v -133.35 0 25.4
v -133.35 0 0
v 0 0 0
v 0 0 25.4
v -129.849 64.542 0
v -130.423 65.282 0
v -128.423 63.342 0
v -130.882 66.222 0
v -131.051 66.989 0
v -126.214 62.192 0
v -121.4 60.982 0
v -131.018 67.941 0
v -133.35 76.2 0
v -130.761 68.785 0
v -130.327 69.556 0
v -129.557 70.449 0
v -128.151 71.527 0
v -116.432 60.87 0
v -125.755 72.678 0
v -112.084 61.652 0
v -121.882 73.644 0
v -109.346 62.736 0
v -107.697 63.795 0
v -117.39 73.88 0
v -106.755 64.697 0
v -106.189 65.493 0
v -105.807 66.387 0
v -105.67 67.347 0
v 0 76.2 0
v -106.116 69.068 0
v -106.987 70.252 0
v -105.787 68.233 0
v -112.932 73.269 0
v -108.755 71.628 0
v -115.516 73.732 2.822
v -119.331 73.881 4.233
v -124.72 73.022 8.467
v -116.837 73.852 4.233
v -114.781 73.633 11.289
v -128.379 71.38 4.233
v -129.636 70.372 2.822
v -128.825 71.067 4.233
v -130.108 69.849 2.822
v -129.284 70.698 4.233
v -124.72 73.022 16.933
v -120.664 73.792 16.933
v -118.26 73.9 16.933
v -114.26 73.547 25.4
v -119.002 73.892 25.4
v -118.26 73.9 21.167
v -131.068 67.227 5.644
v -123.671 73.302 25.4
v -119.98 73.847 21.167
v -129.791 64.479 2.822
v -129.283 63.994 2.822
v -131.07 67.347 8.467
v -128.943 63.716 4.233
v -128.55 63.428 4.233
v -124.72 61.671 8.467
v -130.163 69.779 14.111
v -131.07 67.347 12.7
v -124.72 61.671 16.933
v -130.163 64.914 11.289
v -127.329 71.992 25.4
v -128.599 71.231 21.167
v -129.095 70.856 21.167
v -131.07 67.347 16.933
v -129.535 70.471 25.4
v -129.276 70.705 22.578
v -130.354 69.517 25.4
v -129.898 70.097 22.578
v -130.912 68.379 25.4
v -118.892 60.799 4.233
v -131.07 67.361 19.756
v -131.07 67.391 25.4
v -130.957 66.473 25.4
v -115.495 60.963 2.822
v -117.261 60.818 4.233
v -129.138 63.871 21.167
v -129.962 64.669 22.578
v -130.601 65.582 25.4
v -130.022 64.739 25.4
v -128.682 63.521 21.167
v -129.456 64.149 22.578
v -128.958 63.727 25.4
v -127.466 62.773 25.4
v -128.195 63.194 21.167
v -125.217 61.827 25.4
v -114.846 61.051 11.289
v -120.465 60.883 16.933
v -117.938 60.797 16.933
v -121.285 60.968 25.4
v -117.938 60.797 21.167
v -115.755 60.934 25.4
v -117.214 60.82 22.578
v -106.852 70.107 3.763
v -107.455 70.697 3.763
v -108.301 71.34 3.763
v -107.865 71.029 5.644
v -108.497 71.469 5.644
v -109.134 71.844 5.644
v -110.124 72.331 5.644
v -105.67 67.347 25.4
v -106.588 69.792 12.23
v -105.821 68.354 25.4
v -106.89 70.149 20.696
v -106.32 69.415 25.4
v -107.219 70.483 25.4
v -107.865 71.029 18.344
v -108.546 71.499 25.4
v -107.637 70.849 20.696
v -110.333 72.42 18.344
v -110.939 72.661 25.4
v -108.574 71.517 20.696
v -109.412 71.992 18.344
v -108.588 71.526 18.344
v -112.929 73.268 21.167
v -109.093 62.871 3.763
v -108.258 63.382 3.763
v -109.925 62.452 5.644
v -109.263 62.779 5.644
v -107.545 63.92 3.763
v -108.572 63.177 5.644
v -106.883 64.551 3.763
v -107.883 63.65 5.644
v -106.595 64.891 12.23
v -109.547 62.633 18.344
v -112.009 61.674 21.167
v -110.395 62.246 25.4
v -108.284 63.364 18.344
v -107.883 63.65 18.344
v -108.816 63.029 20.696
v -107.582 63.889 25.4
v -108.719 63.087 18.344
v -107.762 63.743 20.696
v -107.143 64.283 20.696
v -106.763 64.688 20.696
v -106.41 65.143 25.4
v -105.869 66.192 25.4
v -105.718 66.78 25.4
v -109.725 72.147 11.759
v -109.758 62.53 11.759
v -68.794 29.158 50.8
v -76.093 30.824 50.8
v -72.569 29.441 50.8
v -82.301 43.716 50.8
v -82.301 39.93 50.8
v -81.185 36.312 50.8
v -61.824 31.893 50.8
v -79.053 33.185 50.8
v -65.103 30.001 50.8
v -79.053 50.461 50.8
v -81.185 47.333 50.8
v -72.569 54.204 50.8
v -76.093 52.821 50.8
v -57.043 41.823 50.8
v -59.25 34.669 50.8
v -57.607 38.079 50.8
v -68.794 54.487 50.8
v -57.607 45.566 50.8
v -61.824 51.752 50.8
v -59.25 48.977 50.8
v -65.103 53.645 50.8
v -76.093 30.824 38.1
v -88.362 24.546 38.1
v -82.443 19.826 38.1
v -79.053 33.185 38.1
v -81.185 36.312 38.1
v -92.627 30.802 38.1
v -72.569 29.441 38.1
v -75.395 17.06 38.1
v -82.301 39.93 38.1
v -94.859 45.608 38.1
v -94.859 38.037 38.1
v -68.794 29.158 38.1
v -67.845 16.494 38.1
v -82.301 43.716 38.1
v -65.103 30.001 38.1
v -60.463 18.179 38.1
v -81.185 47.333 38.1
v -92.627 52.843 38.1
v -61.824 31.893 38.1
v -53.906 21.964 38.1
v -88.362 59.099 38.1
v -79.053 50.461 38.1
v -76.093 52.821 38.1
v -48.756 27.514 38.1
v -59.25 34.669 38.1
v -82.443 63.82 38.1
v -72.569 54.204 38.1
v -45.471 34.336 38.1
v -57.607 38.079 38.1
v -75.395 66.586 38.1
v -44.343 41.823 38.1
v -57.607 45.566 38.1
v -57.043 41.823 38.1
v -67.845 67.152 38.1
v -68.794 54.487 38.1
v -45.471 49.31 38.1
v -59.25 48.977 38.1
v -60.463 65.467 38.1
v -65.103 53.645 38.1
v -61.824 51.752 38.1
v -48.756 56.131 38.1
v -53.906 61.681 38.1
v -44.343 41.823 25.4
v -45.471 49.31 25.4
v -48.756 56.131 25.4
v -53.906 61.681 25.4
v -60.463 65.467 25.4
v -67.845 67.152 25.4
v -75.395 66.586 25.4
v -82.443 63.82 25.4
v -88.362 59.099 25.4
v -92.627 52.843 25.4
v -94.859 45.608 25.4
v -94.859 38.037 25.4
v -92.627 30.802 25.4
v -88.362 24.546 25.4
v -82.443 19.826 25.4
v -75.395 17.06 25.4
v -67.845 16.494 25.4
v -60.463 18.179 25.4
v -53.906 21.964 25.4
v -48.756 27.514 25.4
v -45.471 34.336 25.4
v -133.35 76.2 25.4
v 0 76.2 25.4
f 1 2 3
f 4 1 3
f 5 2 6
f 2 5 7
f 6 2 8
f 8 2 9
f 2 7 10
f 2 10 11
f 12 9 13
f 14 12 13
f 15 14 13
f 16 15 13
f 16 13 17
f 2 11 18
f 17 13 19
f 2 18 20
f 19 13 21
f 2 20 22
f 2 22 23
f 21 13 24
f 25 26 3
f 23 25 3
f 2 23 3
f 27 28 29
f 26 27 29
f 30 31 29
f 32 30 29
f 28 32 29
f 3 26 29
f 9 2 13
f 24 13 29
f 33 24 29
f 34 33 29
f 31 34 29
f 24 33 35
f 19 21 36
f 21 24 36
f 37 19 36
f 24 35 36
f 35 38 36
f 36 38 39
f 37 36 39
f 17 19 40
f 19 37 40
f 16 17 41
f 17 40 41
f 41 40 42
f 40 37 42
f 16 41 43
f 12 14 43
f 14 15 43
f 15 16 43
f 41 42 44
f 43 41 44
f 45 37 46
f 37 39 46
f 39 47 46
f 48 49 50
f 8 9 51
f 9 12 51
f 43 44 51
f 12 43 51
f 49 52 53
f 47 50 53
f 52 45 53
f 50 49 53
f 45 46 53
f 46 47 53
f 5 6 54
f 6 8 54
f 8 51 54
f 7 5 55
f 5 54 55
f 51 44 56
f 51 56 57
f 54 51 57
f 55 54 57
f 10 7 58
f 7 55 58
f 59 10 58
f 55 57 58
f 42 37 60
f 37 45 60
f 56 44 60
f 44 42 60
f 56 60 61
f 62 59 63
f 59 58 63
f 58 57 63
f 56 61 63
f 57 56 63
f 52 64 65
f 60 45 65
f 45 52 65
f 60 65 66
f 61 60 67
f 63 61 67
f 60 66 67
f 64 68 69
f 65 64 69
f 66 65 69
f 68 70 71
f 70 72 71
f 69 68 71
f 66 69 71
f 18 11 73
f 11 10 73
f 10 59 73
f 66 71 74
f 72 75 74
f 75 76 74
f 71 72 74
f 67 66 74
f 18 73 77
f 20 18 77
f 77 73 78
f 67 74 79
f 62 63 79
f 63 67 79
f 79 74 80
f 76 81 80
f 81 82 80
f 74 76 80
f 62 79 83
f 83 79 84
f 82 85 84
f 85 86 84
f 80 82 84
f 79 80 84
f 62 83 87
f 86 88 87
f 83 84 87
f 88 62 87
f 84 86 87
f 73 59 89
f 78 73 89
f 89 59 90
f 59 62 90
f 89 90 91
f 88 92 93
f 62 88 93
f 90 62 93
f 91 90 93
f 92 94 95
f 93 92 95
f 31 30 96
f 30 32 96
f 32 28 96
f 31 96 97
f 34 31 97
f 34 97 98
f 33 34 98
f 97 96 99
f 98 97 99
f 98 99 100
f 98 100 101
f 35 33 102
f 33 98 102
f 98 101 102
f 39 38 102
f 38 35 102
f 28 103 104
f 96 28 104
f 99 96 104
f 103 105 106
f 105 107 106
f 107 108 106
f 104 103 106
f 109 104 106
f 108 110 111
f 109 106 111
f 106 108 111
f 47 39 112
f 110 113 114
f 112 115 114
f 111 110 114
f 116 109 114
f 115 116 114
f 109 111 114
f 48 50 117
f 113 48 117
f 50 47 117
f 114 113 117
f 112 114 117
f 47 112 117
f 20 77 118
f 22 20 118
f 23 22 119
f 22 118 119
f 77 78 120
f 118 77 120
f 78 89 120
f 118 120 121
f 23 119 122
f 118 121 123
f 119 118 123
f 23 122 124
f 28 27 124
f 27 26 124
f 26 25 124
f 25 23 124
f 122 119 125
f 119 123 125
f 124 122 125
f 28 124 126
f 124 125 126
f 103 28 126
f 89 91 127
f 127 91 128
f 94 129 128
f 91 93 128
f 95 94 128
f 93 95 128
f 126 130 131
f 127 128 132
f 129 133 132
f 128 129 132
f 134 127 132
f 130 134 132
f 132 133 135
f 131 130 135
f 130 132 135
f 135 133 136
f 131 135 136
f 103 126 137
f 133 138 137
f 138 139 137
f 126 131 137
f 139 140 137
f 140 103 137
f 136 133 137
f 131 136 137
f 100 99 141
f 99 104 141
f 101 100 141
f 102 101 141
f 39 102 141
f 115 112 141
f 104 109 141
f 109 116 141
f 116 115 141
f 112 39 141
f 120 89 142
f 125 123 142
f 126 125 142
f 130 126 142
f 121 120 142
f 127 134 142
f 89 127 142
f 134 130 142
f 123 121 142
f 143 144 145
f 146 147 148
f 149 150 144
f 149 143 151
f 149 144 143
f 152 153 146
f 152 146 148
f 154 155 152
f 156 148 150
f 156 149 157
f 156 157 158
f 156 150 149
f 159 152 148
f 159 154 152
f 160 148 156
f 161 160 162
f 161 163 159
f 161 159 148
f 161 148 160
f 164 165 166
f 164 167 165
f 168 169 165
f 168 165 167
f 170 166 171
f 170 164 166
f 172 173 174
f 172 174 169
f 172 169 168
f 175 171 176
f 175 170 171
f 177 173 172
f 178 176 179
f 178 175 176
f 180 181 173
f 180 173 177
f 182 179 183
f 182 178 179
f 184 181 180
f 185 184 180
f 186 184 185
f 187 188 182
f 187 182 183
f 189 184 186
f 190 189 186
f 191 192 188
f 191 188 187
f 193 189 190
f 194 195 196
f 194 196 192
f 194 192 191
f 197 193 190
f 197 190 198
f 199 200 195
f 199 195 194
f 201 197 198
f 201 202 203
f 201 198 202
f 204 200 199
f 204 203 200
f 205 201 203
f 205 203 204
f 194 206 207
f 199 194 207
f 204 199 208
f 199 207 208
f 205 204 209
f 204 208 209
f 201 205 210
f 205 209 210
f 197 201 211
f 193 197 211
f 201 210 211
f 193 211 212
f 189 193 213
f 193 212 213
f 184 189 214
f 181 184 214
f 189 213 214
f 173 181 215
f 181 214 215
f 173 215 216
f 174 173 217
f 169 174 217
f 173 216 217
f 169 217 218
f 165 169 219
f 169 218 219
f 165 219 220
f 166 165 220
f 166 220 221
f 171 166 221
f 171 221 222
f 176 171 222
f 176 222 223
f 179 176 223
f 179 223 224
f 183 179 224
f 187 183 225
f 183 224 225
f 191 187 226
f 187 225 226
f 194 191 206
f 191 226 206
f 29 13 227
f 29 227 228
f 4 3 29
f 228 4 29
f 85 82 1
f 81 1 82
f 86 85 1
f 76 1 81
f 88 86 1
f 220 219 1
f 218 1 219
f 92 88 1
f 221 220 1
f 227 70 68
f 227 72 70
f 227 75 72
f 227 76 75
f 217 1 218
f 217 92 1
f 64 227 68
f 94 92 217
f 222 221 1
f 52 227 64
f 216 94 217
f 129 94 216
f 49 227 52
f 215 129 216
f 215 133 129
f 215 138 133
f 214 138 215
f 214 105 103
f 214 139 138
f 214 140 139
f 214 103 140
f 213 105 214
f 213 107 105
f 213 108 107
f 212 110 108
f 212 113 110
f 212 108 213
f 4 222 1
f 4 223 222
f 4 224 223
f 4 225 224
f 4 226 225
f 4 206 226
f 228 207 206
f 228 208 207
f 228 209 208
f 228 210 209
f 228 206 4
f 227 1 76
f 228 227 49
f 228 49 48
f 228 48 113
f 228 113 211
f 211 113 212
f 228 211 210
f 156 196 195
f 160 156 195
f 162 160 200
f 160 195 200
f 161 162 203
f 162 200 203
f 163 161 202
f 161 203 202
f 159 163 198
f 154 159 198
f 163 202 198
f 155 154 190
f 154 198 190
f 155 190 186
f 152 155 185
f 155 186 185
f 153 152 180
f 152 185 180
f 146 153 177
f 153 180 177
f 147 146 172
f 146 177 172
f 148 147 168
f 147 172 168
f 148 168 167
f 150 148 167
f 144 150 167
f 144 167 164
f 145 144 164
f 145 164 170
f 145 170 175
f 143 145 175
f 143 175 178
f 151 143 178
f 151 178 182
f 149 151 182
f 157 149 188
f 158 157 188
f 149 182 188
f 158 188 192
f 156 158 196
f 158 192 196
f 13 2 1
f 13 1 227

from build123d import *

# Parameters (mm, degrees)
F0_W     = 133.35
F0_H     = 76.2
F1_DEPTH = 25.4
F2_R     = 25.4
F3_DEPTH = 12.7
F4_R     = 12.7
F5_DEPTH = 12.7
F7_DEPTH = 25.401


with BuildPart() as f1:
    # F0 (on Top) → F1 (new body)
    with BuildSketch(Plane.XY):
        with Locations((-66.675, 38.1)):
            Rectangle(F0_W, F0_H)
    extrude(amount=F1_DEPTH)

    # F2 (on face) → F3 (join)
    with BuildSketch(Plane.XY.offset(25.4)):
        with Locations((-69.742762, 41.82275)):
            Circle(F2_R)
    extrude(amount=F3_DEPTH)

    # F4 (on face) → F5 (join)
    with BuildSketch(Plane.XY.offset(38.1)):
        with Locations((-69.742762, 41.82275)):
            Circle(F4_R)
    extrude(amount=F5_DEPTH)

    # F6 (on face) → F7 (cut, through all)
    with BuildSketch(Plane.XY.offset(25.4)):
        with BuildLine():
            add(Edge.make_bspline(
                [(-105.670391, 67.346543), (-105.670391, 78.697359), (-124.720391, 73.021951), (-143.770391, 67.346543), (-124.720391, 61.671135), (-105.670391, 55.995727), (-105.670391, 67.346543)],
                knots=[0, 0, 0, 2.094395, 2.094395, 4.18879, 4.18879, 6.283185, 6.283185, 6.283185], degree=2, weights=[1, 0.5, 1, 0.5, 1, 0.5, 1]))
        make_face()
    extrude(amount=-F7_DEPTH, mode=Mode.SUBTRACT)


solid = f1.part
